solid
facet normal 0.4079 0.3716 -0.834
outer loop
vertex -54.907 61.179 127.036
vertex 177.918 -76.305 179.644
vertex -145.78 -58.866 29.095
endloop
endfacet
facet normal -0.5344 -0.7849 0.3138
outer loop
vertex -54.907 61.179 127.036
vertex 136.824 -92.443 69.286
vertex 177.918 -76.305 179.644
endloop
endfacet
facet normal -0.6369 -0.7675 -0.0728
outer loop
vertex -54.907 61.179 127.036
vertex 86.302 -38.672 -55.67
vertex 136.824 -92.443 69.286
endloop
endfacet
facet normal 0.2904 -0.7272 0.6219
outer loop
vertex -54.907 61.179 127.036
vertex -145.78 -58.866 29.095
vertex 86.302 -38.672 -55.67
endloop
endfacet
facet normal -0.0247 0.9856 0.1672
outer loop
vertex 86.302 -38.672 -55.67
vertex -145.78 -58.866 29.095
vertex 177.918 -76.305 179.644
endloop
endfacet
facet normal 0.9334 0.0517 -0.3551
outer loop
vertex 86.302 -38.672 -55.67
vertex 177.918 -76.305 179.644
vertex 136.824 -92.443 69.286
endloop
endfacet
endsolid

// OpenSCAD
polyhedron(points=[[-145.78009412705572, -58.86631142910991, 29.09505796499724], [177.91763378404346, -76.30460205654303, 179.6442185801822], [136.8235029141481, -92.44308861306085, 69.2857592167079], [86.3018692333161, -38.671800367783504, -55.6698745335662], [-54.90736410628014, 61.17887528284564, 127.03563127993215]], faces=[[0, 1, 4], [1, 2, 4], [2, 3, 4], [3, 0, 4], [1, 0, 3], [2, 1, 3]]);
